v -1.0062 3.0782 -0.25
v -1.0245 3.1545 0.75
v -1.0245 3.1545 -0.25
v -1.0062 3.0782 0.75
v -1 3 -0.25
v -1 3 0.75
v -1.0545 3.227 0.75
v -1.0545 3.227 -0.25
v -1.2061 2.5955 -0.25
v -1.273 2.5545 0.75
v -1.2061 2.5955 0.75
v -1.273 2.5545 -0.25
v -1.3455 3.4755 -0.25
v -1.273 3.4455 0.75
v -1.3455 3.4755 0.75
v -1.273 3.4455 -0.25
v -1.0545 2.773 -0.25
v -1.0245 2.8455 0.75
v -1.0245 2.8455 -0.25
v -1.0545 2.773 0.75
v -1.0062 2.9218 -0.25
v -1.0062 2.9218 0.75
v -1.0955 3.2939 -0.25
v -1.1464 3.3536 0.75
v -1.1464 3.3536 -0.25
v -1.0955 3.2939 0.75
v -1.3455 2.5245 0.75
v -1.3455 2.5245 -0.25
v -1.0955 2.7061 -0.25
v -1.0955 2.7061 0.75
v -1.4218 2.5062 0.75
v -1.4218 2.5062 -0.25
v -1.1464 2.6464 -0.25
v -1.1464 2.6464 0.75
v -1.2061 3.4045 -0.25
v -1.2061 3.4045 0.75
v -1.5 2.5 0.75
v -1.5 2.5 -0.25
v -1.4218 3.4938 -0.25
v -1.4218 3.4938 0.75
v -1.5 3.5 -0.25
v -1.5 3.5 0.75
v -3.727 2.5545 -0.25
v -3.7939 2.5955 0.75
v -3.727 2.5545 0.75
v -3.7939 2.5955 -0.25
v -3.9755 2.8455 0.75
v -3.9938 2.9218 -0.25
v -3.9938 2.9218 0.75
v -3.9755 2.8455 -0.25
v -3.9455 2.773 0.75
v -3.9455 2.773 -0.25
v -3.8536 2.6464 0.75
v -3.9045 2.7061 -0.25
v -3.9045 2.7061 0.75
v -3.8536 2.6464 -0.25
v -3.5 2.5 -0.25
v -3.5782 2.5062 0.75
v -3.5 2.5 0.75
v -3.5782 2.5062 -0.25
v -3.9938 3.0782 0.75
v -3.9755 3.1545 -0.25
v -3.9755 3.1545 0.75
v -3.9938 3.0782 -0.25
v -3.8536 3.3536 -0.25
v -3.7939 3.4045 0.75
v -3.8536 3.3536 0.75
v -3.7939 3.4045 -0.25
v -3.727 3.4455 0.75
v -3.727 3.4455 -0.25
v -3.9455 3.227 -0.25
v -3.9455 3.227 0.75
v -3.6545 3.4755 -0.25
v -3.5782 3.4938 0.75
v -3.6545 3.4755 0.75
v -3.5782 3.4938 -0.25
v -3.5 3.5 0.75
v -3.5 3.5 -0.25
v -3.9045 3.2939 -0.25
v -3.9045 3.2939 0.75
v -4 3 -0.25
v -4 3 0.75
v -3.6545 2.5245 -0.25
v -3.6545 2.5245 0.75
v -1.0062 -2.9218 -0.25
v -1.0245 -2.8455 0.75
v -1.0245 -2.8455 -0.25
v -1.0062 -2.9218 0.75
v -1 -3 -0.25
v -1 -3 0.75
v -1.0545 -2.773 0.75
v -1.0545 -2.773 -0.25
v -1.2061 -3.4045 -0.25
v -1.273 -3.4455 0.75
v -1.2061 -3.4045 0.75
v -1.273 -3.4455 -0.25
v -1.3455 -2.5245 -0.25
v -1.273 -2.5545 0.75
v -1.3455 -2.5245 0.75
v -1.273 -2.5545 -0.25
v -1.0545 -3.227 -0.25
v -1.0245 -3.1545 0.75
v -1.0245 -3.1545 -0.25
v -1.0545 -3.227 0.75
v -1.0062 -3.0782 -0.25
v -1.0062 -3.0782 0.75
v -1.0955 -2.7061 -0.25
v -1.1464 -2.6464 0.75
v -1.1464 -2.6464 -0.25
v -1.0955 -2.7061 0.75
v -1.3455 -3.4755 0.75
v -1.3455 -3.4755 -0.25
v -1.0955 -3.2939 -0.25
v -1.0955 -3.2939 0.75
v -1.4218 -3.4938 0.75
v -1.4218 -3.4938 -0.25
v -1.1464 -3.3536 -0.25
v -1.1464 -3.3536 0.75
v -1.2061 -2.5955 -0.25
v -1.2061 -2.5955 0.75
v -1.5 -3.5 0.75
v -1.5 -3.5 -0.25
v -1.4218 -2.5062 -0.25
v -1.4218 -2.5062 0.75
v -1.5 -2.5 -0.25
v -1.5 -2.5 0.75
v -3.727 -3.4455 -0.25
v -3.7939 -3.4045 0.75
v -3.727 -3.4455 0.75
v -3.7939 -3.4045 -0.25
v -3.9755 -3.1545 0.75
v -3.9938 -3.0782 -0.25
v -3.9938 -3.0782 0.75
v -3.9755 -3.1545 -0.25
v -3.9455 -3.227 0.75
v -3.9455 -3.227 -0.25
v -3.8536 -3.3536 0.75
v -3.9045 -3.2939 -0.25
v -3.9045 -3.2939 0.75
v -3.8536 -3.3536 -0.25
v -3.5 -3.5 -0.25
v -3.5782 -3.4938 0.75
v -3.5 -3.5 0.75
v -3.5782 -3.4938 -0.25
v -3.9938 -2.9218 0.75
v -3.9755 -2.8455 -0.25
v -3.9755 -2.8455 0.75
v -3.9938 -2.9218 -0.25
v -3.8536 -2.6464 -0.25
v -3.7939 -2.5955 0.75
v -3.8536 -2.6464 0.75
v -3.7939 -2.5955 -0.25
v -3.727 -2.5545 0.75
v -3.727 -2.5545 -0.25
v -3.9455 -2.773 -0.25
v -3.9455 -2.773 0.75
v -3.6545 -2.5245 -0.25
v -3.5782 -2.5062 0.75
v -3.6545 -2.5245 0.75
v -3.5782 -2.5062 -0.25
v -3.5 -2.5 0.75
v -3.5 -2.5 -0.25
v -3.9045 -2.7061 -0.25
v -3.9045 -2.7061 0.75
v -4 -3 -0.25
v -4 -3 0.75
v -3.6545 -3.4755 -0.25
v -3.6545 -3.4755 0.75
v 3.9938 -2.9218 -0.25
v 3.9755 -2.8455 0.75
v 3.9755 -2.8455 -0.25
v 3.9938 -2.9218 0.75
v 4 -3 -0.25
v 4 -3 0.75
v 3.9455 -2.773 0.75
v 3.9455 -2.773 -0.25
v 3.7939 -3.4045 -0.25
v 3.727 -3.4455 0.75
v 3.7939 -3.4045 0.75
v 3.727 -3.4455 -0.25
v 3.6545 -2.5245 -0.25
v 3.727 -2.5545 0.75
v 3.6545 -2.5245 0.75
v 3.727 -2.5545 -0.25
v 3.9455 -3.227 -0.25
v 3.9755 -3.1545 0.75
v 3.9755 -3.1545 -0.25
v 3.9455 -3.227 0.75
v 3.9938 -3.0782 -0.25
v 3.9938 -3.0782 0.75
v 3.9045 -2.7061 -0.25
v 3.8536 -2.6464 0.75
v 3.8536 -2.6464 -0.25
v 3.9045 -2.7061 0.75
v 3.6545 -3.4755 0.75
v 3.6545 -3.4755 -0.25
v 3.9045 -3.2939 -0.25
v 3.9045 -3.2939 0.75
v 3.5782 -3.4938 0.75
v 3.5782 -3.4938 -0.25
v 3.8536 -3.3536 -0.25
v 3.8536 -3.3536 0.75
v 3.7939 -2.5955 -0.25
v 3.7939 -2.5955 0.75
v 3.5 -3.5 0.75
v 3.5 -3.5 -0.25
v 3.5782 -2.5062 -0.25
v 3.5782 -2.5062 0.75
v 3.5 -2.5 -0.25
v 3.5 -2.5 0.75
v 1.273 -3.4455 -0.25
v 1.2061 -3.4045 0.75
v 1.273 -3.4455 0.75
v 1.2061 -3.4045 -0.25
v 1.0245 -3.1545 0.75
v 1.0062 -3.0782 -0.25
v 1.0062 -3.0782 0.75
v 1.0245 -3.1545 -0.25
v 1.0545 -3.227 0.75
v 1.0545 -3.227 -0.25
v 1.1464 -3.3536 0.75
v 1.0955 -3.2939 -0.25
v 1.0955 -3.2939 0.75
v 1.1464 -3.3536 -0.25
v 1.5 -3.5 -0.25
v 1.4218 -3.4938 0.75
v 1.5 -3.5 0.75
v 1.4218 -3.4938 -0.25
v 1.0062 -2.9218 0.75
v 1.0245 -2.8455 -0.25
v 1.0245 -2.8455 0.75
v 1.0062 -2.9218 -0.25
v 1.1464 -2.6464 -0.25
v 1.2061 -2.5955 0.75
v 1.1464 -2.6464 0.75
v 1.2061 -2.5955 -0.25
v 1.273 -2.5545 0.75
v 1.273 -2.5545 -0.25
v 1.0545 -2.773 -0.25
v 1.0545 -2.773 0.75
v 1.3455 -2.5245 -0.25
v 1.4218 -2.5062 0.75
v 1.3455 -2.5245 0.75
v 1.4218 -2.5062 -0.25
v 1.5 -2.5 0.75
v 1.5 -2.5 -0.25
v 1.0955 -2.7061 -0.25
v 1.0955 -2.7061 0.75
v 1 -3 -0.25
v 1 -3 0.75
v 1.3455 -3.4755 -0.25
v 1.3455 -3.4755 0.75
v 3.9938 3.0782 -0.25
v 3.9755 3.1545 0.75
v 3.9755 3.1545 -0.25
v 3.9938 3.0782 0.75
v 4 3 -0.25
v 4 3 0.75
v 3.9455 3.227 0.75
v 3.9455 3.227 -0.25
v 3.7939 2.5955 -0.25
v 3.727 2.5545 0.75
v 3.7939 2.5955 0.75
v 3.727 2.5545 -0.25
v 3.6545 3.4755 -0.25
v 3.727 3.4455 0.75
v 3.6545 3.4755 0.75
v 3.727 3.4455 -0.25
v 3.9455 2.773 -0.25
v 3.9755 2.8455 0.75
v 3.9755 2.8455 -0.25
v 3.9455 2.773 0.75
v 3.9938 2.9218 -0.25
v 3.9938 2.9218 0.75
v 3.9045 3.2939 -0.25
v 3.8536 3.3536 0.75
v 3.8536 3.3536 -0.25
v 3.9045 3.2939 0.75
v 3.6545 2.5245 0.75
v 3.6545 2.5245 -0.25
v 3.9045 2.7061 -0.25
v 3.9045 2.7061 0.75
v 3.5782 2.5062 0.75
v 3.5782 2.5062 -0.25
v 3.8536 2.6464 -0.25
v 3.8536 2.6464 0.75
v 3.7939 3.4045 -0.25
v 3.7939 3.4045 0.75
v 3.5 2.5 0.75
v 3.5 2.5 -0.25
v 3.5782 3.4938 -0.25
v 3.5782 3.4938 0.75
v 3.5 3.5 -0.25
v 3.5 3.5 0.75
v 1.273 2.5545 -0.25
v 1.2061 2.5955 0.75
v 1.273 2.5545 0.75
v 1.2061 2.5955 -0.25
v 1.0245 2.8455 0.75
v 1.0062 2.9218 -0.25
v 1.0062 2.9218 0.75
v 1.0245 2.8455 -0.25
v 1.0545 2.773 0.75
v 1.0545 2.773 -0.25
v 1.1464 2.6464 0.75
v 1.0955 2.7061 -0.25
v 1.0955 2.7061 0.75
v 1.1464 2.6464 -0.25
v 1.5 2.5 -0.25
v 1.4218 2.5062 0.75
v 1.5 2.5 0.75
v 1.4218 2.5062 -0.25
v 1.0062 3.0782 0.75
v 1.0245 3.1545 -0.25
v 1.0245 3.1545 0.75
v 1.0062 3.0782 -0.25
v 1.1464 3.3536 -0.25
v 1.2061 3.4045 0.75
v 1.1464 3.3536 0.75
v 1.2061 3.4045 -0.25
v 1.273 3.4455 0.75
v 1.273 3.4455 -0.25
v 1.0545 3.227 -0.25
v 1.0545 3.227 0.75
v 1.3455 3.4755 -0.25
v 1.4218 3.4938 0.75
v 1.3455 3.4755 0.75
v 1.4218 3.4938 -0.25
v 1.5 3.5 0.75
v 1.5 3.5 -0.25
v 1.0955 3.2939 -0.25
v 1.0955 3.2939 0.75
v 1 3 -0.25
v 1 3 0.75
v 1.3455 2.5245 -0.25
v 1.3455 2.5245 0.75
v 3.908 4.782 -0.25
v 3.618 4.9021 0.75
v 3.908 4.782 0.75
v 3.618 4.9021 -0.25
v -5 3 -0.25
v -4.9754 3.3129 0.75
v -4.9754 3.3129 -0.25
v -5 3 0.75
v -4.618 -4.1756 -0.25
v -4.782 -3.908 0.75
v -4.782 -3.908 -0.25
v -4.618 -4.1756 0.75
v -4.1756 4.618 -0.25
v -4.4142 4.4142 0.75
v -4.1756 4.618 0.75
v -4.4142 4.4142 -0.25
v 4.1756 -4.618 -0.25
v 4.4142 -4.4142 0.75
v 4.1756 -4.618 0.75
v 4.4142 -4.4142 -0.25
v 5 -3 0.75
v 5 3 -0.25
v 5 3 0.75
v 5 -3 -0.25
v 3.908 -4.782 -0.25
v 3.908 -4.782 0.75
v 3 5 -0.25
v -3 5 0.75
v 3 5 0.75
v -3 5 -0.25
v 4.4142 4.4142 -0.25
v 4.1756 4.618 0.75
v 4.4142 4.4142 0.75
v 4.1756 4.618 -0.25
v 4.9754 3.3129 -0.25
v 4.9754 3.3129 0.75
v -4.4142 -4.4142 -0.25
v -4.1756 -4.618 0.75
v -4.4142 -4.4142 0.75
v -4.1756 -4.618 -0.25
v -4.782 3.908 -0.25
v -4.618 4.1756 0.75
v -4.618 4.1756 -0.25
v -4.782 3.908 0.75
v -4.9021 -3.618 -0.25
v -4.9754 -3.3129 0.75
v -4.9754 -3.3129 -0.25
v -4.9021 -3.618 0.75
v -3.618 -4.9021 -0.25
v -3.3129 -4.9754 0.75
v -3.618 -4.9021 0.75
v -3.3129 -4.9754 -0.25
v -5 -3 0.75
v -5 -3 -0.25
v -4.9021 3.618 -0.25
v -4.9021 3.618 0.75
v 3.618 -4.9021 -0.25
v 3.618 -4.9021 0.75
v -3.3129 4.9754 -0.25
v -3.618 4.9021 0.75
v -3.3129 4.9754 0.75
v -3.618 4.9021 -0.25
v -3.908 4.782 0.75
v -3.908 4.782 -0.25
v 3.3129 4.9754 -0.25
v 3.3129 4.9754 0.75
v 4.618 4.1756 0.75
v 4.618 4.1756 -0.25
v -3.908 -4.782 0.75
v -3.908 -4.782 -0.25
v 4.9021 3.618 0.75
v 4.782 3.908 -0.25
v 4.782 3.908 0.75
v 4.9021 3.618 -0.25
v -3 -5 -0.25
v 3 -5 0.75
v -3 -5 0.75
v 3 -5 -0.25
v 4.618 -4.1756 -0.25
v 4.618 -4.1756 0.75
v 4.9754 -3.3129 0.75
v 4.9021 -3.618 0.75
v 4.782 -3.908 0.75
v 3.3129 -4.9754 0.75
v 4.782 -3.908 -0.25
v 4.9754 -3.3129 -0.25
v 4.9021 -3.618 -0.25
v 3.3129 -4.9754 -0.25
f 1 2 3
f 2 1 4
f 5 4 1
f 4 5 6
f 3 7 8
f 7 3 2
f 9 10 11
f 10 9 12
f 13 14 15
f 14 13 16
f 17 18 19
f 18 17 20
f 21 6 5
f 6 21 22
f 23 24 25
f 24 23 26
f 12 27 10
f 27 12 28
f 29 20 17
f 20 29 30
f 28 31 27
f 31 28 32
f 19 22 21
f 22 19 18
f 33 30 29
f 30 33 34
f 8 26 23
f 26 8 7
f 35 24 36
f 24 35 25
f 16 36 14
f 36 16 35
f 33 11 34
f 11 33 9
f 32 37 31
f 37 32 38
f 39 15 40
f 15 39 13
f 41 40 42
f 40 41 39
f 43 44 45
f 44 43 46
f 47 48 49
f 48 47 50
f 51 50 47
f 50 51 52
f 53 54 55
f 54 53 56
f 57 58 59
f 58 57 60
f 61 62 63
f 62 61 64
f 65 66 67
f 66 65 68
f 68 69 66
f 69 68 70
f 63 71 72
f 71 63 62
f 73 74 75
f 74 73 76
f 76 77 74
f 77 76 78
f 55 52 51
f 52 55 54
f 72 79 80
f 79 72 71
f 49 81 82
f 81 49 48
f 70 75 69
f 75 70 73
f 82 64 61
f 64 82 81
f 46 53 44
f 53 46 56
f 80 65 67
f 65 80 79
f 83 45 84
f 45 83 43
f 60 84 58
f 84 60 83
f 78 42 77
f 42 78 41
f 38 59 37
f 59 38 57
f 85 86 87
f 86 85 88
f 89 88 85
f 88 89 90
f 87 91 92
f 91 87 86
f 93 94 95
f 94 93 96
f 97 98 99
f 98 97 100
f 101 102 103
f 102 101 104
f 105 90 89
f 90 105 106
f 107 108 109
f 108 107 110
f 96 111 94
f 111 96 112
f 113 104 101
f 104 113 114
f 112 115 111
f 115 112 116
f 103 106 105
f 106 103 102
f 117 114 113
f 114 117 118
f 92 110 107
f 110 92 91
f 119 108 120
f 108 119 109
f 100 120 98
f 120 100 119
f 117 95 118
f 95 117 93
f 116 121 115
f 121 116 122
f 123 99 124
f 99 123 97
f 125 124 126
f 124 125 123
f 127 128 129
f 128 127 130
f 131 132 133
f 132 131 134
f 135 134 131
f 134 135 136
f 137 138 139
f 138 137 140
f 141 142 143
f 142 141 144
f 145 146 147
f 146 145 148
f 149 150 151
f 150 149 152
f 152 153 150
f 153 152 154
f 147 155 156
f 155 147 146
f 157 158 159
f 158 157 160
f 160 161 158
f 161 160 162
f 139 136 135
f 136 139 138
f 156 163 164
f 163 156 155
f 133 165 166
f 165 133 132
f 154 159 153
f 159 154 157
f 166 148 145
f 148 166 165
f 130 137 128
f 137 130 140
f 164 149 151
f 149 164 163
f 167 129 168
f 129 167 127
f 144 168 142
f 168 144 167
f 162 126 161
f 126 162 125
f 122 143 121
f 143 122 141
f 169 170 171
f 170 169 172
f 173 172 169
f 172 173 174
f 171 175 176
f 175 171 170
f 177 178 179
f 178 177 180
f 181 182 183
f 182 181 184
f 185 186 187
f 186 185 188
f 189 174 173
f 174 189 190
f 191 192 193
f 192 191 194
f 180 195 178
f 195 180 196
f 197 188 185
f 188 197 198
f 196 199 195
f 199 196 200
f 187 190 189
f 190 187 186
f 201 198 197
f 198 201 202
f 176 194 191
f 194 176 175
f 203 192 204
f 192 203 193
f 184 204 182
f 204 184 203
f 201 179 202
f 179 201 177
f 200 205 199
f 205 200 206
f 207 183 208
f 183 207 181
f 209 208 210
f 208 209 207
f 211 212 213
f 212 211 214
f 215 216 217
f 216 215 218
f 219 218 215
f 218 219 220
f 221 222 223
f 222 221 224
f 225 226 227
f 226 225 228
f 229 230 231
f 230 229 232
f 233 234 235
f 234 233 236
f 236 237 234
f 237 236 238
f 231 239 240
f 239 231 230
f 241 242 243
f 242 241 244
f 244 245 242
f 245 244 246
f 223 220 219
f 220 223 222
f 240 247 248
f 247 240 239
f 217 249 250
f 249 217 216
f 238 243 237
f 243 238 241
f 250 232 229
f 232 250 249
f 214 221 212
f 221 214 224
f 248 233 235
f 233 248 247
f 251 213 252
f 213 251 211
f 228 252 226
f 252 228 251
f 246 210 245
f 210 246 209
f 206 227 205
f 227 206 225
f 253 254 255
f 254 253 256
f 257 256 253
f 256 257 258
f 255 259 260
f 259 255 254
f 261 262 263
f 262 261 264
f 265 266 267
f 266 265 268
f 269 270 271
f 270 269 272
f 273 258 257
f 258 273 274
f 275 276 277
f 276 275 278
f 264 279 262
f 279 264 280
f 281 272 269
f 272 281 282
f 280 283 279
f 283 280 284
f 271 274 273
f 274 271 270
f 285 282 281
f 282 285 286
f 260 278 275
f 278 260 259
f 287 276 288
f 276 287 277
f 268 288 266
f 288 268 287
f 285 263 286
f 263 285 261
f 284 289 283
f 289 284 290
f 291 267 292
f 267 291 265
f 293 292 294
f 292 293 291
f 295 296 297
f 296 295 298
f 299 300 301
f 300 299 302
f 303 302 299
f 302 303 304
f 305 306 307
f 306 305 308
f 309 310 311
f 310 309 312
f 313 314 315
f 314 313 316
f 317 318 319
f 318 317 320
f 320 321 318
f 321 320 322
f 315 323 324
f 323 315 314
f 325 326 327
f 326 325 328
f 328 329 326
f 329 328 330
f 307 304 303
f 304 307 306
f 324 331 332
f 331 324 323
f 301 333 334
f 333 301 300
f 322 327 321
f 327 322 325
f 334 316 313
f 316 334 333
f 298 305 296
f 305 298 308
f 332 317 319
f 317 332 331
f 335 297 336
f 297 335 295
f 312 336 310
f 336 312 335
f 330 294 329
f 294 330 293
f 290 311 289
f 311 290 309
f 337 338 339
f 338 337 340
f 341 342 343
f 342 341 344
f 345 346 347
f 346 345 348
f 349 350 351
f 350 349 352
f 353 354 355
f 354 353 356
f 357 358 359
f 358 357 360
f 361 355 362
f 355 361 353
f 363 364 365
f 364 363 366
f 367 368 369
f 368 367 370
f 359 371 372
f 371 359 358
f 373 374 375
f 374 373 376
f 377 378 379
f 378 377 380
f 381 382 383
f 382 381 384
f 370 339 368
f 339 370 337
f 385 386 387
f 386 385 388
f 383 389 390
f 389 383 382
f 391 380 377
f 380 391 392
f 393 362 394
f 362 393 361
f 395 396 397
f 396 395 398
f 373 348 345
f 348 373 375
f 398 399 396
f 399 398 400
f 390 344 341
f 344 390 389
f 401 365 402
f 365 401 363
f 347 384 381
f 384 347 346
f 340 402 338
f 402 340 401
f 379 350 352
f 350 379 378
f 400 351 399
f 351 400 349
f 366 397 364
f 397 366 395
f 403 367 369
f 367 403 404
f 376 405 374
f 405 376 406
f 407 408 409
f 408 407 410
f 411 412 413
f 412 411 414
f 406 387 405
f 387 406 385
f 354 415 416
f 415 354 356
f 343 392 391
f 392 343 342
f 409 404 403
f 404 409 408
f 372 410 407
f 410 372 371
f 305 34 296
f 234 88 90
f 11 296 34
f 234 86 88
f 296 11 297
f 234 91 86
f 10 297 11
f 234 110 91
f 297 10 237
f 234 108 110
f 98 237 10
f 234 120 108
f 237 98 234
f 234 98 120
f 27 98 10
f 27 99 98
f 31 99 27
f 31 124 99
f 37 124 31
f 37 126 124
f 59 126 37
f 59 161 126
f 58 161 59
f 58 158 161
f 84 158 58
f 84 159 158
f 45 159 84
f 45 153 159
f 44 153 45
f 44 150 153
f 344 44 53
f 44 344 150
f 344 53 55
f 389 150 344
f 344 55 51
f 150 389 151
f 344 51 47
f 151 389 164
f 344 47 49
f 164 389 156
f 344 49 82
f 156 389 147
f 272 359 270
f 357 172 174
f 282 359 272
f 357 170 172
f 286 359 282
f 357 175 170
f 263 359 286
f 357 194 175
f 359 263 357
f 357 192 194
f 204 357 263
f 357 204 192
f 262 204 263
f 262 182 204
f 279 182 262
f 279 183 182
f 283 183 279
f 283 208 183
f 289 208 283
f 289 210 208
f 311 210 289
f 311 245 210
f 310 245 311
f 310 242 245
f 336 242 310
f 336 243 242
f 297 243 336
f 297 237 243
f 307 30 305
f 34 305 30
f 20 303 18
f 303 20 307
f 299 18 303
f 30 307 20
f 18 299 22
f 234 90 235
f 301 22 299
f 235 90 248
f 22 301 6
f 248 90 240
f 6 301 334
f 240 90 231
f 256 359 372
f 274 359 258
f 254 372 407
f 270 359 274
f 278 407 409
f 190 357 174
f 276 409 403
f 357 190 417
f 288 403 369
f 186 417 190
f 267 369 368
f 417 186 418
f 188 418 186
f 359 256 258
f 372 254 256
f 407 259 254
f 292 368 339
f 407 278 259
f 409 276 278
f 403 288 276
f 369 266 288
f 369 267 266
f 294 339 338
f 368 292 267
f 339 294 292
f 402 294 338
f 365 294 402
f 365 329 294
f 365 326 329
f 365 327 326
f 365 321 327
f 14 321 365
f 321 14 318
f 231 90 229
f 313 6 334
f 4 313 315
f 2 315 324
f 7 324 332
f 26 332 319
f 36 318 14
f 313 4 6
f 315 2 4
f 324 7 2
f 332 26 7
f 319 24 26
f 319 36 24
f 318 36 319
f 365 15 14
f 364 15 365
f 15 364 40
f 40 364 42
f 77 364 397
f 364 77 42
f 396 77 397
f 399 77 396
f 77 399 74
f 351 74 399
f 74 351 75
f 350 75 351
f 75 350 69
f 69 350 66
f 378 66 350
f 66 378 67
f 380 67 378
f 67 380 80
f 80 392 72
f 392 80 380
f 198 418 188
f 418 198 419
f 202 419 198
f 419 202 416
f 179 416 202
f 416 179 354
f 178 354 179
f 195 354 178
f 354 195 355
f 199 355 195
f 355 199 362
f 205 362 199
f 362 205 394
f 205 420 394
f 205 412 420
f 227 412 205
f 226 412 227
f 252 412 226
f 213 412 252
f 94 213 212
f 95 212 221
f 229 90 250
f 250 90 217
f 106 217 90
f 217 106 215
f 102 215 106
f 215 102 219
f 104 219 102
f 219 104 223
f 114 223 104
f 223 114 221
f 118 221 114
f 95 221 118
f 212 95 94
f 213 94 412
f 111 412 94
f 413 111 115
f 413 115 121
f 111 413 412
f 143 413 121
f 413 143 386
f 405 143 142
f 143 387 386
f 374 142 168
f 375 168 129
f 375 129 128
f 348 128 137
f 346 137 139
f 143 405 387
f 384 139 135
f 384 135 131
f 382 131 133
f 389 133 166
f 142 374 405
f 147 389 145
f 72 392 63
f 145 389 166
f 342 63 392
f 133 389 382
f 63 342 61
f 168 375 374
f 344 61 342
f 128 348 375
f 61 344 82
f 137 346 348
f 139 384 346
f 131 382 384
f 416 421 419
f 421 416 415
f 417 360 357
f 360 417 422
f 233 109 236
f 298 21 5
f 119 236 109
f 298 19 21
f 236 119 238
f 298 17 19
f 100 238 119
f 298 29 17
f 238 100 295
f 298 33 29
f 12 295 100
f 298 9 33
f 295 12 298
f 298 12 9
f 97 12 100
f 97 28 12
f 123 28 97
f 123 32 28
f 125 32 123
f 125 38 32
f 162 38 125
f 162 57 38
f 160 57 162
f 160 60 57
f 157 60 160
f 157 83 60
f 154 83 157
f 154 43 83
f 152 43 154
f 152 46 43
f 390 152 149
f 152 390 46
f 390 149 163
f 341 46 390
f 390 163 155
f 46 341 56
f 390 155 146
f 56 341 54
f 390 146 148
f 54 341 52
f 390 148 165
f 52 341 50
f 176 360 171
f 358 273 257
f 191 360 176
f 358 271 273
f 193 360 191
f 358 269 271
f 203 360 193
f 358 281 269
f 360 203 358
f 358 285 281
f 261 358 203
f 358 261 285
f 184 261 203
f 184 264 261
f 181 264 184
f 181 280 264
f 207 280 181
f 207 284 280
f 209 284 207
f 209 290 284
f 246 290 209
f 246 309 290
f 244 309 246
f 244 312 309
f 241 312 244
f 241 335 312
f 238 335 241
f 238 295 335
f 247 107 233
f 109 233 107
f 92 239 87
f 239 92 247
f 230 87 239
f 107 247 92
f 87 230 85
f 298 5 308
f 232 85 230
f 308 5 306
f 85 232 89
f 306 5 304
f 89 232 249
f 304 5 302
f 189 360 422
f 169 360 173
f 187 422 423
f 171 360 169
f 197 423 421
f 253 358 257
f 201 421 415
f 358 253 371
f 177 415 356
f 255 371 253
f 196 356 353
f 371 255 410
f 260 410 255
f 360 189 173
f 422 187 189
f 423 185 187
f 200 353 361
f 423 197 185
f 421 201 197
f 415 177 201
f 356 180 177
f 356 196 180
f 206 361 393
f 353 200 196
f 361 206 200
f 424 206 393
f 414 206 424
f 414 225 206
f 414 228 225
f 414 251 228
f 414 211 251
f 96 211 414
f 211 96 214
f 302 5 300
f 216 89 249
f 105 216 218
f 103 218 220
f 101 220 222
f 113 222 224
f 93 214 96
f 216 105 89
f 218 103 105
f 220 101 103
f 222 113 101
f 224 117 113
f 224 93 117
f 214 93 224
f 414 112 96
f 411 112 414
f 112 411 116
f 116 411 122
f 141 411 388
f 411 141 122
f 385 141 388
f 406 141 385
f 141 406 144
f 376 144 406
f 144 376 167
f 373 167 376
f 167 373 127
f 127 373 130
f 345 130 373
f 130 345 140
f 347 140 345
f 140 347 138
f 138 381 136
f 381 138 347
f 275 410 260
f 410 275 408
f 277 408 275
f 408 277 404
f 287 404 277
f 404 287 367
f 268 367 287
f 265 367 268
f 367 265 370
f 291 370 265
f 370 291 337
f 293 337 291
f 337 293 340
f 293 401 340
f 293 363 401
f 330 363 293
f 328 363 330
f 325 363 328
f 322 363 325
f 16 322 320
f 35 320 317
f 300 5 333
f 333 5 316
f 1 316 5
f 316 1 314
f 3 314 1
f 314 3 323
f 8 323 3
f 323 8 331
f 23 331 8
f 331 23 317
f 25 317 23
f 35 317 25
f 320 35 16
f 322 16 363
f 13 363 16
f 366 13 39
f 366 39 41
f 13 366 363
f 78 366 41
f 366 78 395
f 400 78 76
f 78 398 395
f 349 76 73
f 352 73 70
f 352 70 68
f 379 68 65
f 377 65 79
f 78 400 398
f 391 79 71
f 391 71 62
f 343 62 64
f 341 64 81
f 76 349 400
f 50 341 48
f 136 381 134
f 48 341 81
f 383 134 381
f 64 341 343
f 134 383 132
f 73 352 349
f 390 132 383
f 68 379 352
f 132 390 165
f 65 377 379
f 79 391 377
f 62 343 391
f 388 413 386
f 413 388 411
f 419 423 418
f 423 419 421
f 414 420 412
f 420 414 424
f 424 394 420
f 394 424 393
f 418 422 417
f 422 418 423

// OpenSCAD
module Piece_01(){

    module Mech_Piece_01(){

    Key_Lenght = 10;
    Key_Height = 10;
    Key_Width = 15;

    color("#a8b0b2")
    union(){
        translate([1,0,0])
        cylinder(5,0.5,0.5, $fn=40, center=true);

        translate([-1,0,0])
        cylinder(5,0.5,0.5, $fn=40, center=true);

        cube([2,1,5],center = true);
        }

    }
    difference(){

        minkowski(){

            cube([6,6,0.5],center = true);

            translate([0,0,0], $fn = 40)
            cylinder(0.5,2,2);
        }
        translate([-2.5,3,0]){
        Mech_Piece_01();
        }
        translate([-2.5,-3,0]){
        Mech_Piece_01();
        }
        translate([2.5,-3,0]){
        Mech_Piece_01();
        }
        translate([2.5,3,0]){
        Mech_Piece_01();
        }
    }

}

color("gray")
Piece_01();


// Written by Nicolì Angelo (Gengio) 2024: 
// MIT License

//Permission is hereby granted, free of charge, to any person obtaining a copy of this software and associated documentation files (the "Software"), to deal in the Software without restriction, including without limitation the rights to use, copy, modify, merge, publish, distribute, sublicense, and/or sell copies of the Software, and to permit persons to whom the Software is furnished to do so, subject to the following conditions:

//The above copyright notice and this permission notice shall be included in all copies or substantial portions of the Software.

//THE SOFTWARE IS PROVIDED "AS IS", WITHOUT WARRANTY OF ANY KIND, EXPRESS OR IMPLIED, INCLUDING BUT NOT LIMITED TO THE WARRANTIES OF MERCHANTABILITY, FITNESS FOR A PARTICULAR PURPOSE AND NONINFRINGEMENT. IN NO EVENT SHALL THE AUTHORS OR COPYRIGHT HOLDERS BE LIABLE FOR ANY CLAIM, DAMAGES OR OTHER LIABILITY, WHETHER IN AN ACTION OF CONTRACT, TORT OR OTHERWISE, ARISING FROM, OUT OF OR IN CONNECTION WITH THE SOFTWARE OR THE USE OR OTHER DEALINGS IN THE SOFTWARE.
